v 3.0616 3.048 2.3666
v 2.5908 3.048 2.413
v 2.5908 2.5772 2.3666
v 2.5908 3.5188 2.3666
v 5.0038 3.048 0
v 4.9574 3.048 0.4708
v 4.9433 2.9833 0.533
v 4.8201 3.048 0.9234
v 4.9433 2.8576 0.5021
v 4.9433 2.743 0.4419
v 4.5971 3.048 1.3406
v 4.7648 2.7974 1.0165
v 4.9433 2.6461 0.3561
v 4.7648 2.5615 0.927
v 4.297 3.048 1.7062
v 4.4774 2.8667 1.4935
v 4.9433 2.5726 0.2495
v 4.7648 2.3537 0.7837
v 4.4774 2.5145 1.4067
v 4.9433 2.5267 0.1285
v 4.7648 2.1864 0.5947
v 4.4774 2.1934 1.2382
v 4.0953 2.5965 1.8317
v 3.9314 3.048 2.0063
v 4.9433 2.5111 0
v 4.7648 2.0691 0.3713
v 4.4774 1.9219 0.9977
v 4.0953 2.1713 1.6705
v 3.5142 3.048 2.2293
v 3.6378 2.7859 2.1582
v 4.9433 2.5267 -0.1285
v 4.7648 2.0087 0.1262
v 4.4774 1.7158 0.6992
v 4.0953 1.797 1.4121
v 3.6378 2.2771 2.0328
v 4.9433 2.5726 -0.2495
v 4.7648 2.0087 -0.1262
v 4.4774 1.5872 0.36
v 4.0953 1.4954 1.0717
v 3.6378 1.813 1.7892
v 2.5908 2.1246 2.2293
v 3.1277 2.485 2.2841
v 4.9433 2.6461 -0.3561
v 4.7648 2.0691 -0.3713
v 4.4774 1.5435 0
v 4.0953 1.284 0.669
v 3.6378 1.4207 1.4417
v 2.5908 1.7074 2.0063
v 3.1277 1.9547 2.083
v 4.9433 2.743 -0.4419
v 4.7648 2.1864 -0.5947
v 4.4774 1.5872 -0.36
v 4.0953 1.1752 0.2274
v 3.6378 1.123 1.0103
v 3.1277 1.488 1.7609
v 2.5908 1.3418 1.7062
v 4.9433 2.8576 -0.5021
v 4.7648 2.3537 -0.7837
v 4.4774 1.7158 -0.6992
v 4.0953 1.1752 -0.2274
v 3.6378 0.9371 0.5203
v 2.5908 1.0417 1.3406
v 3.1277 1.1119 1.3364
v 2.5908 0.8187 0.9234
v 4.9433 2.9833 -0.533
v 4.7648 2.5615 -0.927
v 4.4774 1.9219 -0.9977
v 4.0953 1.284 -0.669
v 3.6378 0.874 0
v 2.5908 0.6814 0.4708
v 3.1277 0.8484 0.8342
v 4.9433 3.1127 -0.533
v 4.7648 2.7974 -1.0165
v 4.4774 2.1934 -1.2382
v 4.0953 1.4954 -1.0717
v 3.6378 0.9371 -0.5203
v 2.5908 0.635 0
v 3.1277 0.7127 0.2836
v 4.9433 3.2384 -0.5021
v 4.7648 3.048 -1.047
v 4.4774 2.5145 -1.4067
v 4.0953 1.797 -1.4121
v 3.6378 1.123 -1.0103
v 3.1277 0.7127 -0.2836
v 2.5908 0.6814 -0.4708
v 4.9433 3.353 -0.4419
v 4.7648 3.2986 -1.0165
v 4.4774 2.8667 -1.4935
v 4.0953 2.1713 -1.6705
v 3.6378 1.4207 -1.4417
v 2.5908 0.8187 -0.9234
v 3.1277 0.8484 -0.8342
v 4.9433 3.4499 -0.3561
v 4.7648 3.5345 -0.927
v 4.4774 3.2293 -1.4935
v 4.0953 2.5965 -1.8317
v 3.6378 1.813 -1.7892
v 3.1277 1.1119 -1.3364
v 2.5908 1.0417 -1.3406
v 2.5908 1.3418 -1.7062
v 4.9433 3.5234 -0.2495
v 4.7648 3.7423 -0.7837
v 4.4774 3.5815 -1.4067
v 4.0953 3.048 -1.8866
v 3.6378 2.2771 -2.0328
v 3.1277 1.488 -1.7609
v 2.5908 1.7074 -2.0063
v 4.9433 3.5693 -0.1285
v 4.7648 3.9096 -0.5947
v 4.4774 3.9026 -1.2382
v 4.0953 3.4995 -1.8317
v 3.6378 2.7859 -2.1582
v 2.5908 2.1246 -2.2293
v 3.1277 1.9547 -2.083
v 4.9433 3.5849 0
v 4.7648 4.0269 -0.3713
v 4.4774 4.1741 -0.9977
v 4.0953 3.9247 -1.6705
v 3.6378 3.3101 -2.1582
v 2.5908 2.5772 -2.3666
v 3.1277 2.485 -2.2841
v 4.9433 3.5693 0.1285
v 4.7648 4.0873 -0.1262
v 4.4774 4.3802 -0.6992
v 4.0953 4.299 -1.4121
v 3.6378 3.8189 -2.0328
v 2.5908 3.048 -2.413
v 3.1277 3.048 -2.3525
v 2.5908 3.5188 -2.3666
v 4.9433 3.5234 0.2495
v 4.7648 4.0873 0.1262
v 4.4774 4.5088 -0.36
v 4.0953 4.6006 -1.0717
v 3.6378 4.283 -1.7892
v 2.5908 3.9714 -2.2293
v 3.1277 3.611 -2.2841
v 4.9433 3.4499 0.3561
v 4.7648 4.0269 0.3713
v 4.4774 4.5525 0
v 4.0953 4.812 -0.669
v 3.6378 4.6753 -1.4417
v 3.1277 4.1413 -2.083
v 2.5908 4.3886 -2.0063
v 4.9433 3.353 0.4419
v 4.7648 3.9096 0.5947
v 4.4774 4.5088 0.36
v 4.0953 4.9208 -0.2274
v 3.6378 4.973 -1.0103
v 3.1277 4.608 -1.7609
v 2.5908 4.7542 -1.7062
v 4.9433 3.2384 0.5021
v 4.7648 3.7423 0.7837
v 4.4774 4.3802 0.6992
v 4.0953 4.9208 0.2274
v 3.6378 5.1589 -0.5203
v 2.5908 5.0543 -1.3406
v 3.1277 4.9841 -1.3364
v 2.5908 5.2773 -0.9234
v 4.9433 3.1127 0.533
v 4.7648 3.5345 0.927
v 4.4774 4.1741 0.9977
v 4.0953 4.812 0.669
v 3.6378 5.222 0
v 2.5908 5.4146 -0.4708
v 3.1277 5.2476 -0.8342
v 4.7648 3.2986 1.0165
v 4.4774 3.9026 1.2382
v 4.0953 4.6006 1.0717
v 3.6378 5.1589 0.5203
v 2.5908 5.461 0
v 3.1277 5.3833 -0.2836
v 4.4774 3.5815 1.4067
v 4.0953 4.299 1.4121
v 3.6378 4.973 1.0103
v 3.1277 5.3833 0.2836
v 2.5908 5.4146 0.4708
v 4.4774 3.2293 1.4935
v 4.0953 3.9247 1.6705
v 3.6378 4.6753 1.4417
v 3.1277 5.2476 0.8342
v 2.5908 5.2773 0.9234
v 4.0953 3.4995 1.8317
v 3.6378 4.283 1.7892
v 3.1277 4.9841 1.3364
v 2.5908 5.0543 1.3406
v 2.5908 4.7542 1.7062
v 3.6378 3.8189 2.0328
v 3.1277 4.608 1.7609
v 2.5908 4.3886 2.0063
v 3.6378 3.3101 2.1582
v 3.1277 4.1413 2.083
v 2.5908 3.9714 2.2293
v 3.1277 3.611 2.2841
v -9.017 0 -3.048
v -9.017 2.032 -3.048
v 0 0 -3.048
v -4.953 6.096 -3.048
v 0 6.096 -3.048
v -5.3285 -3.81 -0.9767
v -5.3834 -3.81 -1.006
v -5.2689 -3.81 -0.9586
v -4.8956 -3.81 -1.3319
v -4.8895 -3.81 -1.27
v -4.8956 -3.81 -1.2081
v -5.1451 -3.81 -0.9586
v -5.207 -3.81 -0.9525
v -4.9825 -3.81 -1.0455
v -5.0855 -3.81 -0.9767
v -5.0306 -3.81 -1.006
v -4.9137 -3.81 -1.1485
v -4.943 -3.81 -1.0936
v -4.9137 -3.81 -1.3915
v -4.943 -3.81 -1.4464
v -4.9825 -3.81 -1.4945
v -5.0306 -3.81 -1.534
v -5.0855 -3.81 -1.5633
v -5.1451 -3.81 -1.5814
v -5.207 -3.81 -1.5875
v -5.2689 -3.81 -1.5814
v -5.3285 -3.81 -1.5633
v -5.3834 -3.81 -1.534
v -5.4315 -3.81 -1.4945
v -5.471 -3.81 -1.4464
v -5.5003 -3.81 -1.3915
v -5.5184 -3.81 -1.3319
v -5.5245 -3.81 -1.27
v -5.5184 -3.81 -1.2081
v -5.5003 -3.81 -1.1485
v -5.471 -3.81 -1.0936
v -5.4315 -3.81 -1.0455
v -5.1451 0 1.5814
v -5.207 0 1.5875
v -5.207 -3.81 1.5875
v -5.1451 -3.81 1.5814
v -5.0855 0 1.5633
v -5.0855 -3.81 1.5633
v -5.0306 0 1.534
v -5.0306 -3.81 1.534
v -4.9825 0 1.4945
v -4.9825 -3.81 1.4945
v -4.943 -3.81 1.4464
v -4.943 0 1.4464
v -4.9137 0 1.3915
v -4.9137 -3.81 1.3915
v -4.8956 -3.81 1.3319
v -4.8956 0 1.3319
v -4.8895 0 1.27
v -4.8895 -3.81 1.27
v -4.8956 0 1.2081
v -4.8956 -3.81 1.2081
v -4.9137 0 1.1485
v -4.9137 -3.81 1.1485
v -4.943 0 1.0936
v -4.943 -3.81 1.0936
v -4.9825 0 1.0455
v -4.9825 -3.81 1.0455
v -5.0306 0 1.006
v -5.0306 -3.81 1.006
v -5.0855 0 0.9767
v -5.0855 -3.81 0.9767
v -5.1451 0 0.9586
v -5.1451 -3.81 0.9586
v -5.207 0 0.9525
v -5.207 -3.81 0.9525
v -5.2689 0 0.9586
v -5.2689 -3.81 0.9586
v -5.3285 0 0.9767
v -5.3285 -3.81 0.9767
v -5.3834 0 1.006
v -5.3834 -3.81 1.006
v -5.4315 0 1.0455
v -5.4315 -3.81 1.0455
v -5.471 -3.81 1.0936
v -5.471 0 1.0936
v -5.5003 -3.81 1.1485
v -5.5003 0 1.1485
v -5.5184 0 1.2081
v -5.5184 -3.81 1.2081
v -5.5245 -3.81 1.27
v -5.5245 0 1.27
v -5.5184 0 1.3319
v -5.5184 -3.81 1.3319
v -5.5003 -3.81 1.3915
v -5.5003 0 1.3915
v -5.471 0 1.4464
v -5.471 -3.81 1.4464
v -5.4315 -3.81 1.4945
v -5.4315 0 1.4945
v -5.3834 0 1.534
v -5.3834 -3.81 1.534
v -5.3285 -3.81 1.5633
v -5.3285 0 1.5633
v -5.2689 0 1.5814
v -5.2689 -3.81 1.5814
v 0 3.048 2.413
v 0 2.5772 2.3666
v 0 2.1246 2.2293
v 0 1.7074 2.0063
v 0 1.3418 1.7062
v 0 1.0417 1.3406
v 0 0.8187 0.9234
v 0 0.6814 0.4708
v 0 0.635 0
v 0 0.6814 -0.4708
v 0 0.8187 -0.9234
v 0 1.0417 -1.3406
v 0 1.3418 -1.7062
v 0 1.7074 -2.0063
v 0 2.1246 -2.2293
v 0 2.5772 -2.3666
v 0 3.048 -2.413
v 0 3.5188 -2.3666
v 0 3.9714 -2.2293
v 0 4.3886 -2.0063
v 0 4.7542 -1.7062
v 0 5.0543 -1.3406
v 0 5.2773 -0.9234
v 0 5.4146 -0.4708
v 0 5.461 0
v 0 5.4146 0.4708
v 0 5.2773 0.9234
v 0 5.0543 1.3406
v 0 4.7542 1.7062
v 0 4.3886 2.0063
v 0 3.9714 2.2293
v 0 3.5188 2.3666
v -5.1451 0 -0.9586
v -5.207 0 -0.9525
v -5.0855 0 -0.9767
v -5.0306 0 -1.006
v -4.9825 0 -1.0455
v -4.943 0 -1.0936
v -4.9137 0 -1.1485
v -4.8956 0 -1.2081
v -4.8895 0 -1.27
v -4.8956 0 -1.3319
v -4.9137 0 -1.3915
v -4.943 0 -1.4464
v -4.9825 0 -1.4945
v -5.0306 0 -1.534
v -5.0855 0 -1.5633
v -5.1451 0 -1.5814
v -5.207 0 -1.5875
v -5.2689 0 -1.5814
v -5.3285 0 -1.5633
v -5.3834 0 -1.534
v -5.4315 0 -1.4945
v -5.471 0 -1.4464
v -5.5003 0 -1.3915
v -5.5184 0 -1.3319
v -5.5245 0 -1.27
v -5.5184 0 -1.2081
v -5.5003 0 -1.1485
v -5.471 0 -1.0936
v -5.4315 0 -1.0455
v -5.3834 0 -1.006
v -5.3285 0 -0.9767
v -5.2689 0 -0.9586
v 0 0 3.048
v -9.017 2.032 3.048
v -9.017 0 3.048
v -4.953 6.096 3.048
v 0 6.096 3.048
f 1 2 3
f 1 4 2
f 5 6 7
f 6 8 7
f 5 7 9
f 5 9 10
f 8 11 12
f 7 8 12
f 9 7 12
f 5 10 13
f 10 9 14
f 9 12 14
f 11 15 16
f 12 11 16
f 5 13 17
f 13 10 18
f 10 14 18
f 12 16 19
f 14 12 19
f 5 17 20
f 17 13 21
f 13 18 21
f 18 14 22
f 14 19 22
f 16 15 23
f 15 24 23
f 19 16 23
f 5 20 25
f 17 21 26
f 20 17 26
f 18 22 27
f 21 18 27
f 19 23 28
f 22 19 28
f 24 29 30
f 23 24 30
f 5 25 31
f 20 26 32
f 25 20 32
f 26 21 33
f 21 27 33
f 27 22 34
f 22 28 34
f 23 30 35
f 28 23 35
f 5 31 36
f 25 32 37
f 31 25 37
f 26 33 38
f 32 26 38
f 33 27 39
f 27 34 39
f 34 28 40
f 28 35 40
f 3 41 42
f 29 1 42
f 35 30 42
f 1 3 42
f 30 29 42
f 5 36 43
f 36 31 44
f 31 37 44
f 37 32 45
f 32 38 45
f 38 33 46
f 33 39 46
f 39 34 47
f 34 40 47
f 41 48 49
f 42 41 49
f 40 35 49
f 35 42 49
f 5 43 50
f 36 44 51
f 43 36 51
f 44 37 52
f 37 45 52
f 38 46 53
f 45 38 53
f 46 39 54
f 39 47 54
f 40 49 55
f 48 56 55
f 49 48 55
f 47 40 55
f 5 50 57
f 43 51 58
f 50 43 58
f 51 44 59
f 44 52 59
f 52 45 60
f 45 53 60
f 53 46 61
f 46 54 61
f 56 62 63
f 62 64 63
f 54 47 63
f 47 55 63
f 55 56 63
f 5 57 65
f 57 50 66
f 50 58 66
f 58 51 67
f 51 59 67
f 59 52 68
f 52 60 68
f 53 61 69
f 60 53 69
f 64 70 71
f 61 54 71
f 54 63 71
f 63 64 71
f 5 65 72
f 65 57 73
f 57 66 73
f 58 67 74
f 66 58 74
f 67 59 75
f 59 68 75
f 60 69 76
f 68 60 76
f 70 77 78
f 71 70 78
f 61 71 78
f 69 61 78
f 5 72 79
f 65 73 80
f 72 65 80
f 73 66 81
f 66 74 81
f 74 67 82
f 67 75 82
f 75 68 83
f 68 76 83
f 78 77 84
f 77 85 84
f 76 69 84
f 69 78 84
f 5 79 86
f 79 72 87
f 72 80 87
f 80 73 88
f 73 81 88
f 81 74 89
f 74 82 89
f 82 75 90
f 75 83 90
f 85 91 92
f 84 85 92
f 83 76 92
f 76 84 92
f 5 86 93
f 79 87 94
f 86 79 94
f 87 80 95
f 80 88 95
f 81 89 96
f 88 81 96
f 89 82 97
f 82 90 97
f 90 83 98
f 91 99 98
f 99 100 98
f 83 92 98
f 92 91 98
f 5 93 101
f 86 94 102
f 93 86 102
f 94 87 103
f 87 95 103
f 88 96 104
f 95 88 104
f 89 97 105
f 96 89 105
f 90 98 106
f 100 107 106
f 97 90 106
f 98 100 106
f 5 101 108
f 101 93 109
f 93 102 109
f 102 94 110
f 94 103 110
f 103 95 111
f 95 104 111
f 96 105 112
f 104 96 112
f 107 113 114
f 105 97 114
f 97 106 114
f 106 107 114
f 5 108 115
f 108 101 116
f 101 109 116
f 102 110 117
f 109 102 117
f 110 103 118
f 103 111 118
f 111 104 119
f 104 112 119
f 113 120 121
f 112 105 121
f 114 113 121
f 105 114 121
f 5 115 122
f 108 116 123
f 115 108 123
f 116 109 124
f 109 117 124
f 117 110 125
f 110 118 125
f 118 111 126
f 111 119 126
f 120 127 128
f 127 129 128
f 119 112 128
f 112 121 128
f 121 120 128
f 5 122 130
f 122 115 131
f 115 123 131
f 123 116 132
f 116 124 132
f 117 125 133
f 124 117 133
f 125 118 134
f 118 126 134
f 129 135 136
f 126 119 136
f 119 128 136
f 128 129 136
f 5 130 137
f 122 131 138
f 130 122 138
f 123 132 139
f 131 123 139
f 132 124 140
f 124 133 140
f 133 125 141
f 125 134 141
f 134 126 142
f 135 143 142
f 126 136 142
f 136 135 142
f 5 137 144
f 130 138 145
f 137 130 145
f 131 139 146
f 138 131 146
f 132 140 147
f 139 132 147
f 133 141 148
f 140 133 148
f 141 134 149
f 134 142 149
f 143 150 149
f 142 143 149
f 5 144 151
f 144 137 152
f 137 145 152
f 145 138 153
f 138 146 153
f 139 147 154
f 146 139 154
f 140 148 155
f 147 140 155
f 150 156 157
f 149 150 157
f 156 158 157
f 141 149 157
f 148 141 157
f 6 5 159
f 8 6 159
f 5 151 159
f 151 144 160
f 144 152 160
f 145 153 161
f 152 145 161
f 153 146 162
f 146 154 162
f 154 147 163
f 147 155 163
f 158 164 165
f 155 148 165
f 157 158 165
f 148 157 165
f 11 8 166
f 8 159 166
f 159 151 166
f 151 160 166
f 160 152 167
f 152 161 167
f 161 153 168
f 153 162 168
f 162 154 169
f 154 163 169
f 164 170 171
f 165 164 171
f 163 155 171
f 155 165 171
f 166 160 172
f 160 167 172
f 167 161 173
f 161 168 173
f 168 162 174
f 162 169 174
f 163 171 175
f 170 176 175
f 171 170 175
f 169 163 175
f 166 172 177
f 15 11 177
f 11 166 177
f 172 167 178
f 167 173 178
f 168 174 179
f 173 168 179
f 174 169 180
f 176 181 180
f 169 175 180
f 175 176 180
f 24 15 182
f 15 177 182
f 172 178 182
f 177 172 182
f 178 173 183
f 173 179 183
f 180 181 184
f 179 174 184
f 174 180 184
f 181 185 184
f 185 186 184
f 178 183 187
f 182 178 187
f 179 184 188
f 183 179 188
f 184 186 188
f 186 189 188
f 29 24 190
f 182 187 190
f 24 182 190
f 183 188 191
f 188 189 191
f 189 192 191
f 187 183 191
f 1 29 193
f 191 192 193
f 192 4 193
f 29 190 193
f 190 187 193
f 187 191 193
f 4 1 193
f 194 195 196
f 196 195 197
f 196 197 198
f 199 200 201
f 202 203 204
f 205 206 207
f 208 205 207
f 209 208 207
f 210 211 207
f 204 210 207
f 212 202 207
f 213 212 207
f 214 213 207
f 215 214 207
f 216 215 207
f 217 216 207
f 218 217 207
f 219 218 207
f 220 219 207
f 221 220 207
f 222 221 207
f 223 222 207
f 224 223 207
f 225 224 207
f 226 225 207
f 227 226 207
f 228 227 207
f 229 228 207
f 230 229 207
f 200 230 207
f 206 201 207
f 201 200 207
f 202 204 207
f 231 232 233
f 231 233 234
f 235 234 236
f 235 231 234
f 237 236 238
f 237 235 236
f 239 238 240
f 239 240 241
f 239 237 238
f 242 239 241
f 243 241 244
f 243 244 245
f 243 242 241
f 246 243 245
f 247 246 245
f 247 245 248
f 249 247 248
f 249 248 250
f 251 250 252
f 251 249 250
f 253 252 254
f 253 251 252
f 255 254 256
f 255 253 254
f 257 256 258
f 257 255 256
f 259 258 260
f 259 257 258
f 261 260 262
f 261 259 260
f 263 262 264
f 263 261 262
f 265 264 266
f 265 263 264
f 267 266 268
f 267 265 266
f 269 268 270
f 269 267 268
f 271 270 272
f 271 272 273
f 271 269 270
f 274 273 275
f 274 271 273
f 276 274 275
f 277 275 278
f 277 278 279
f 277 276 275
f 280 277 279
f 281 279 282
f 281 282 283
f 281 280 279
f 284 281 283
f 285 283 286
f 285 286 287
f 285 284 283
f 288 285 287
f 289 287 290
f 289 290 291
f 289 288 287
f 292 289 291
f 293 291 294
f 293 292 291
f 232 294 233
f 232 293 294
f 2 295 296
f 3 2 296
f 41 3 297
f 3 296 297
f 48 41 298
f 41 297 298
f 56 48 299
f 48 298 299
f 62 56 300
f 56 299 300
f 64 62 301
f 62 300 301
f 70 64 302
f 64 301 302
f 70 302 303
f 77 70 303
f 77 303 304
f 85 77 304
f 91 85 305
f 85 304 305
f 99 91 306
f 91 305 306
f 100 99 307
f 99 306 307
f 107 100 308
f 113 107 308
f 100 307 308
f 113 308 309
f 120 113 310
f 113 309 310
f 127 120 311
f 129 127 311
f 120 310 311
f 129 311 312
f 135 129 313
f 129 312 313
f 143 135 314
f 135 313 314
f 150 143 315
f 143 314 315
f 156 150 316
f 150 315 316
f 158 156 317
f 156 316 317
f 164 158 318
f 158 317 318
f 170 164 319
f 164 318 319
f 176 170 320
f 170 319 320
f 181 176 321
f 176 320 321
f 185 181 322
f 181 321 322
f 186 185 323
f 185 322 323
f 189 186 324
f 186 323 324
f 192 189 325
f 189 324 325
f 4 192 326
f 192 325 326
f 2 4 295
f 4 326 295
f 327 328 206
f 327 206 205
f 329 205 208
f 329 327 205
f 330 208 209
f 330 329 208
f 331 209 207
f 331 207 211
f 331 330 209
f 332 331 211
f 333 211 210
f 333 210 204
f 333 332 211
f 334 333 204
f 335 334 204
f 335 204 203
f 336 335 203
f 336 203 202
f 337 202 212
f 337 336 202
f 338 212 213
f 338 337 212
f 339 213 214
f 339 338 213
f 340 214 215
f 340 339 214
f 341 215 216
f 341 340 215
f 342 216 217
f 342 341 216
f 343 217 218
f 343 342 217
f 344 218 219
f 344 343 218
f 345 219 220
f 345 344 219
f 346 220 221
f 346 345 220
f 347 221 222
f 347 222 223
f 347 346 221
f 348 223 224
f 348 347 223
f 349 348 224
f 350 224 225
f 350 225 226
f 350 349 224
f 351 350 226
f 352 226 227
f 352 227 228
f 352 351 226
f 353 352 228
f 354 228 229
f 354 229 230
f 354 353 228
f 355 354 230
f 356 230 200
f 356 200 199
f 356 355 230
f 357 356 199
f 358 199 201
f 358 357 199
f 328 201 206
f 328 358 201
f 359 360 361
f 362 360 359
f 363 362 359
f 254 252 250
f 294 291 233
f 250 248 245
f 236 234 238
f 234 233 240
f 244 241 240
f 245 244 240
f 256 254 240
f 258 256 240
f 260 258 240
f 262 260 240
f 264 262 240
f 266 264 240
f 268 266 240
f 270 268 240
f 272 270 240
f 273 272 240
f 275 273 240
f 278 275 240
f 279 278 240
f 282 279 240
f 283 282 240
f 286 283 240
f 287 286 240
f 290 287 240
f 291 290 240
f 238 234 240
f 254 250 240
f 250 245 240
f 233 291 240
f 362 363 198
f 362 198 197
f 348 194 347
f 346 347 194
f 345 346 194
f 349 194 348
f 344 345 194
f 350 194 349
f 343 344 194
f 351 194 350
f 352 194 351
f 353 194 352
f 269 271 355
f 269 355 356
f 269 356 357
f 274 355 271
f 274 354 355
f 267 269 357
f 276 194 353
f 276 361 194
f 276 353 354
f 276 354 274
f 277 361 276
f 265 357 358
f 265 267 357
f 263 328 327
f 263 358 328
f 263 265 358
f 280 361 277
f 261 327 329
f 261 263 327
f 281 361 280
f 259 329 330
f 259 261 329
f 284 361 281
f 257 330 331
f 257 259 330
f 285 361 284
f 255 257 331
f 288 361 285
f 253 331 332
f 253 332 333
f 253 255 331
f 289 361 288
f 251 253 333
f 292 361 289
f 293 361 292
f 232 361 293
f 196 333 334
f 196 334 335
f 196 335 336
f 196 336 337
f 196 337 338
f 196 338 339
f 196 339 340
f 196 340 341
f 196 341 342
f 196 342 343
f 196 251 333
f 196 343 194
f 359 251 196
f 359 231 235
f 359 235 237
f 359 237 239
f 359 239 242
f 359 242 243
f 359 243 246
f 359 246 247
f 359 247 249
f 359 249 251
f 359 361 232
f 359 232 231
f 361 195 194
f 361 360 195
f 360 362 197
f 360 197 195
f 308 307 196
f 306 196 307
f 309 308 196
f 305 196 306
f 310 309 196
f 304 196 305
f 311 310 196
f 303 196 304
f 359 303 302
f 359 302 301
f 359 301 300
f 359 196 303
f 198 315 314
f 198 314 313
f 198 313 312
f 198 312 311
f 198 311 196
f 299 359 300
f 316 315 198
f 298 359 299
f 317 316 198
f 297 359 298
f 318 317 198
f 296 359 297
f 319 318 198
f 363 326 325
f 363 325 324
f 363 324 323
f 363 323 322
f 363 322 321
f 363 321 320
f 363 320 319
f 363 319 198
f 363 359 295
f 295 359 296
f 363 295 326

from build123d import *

# Parameters (mm, degrees)
EXTRUDE1_DEPTH = 3.048
SKETCH3_R      = 0.3175
EXTRUDE2_DEPTH = 3.81


with BuildPart() as part:
    # Sketch1 → Extrude1 (new, symmetric)
    with BuildSketch(Plane.XY):
        Polygon((0, 0), (0, 6.096), (-4.953, 6.096), (-9.017, 2.032), (-9.017, 0), align=None)
    extrude(amount=EXTRUDE1_DEPTH, both=True)

    # Sketch2 → Revolve1 (revolve)
    with BuildSketch(Plane.XY, mode=Mode.PRIVATE) as revolve1_sk:
        with BuildLine():
            Line((-1.016, 3.048), (5.0038, 3.048))
            ThreePointArc((5.0038, 3.048), (4.297048663, 4.754248663), (2.5908, 5.461))
            Line((2.5908, 5.461), (-1.016, 5.461))
            Line((-1.016, 5.461), (-1.016, 3.048))
        make_face()
    revolve(revolve1_sk.sketch.rotate(Axis((5.0038, 3.048, 0), (1, 0, 0)), 90), axis=Axis((5.0038, 3.048, 0), (1, 0, 0)))

    # Sketch3 → Extrude2 (add)
    with BuildSketch(Plane(origin=(0, 0, 0), x_dir=(1, 0, 0), z_dir=(0, 1, 0))):
        with Locations(Location((-5.207, -1.27, 0), (0, 0, 270))):
            Circle(SKETCH3_R)
        with Locations(Location((-5.207, 1.27, 0), (0, 0, 270))):
            Circle(SKETCH3_R)
    extrude(amount=-EXTRUDE2_DEPTH)


solid = part.part
